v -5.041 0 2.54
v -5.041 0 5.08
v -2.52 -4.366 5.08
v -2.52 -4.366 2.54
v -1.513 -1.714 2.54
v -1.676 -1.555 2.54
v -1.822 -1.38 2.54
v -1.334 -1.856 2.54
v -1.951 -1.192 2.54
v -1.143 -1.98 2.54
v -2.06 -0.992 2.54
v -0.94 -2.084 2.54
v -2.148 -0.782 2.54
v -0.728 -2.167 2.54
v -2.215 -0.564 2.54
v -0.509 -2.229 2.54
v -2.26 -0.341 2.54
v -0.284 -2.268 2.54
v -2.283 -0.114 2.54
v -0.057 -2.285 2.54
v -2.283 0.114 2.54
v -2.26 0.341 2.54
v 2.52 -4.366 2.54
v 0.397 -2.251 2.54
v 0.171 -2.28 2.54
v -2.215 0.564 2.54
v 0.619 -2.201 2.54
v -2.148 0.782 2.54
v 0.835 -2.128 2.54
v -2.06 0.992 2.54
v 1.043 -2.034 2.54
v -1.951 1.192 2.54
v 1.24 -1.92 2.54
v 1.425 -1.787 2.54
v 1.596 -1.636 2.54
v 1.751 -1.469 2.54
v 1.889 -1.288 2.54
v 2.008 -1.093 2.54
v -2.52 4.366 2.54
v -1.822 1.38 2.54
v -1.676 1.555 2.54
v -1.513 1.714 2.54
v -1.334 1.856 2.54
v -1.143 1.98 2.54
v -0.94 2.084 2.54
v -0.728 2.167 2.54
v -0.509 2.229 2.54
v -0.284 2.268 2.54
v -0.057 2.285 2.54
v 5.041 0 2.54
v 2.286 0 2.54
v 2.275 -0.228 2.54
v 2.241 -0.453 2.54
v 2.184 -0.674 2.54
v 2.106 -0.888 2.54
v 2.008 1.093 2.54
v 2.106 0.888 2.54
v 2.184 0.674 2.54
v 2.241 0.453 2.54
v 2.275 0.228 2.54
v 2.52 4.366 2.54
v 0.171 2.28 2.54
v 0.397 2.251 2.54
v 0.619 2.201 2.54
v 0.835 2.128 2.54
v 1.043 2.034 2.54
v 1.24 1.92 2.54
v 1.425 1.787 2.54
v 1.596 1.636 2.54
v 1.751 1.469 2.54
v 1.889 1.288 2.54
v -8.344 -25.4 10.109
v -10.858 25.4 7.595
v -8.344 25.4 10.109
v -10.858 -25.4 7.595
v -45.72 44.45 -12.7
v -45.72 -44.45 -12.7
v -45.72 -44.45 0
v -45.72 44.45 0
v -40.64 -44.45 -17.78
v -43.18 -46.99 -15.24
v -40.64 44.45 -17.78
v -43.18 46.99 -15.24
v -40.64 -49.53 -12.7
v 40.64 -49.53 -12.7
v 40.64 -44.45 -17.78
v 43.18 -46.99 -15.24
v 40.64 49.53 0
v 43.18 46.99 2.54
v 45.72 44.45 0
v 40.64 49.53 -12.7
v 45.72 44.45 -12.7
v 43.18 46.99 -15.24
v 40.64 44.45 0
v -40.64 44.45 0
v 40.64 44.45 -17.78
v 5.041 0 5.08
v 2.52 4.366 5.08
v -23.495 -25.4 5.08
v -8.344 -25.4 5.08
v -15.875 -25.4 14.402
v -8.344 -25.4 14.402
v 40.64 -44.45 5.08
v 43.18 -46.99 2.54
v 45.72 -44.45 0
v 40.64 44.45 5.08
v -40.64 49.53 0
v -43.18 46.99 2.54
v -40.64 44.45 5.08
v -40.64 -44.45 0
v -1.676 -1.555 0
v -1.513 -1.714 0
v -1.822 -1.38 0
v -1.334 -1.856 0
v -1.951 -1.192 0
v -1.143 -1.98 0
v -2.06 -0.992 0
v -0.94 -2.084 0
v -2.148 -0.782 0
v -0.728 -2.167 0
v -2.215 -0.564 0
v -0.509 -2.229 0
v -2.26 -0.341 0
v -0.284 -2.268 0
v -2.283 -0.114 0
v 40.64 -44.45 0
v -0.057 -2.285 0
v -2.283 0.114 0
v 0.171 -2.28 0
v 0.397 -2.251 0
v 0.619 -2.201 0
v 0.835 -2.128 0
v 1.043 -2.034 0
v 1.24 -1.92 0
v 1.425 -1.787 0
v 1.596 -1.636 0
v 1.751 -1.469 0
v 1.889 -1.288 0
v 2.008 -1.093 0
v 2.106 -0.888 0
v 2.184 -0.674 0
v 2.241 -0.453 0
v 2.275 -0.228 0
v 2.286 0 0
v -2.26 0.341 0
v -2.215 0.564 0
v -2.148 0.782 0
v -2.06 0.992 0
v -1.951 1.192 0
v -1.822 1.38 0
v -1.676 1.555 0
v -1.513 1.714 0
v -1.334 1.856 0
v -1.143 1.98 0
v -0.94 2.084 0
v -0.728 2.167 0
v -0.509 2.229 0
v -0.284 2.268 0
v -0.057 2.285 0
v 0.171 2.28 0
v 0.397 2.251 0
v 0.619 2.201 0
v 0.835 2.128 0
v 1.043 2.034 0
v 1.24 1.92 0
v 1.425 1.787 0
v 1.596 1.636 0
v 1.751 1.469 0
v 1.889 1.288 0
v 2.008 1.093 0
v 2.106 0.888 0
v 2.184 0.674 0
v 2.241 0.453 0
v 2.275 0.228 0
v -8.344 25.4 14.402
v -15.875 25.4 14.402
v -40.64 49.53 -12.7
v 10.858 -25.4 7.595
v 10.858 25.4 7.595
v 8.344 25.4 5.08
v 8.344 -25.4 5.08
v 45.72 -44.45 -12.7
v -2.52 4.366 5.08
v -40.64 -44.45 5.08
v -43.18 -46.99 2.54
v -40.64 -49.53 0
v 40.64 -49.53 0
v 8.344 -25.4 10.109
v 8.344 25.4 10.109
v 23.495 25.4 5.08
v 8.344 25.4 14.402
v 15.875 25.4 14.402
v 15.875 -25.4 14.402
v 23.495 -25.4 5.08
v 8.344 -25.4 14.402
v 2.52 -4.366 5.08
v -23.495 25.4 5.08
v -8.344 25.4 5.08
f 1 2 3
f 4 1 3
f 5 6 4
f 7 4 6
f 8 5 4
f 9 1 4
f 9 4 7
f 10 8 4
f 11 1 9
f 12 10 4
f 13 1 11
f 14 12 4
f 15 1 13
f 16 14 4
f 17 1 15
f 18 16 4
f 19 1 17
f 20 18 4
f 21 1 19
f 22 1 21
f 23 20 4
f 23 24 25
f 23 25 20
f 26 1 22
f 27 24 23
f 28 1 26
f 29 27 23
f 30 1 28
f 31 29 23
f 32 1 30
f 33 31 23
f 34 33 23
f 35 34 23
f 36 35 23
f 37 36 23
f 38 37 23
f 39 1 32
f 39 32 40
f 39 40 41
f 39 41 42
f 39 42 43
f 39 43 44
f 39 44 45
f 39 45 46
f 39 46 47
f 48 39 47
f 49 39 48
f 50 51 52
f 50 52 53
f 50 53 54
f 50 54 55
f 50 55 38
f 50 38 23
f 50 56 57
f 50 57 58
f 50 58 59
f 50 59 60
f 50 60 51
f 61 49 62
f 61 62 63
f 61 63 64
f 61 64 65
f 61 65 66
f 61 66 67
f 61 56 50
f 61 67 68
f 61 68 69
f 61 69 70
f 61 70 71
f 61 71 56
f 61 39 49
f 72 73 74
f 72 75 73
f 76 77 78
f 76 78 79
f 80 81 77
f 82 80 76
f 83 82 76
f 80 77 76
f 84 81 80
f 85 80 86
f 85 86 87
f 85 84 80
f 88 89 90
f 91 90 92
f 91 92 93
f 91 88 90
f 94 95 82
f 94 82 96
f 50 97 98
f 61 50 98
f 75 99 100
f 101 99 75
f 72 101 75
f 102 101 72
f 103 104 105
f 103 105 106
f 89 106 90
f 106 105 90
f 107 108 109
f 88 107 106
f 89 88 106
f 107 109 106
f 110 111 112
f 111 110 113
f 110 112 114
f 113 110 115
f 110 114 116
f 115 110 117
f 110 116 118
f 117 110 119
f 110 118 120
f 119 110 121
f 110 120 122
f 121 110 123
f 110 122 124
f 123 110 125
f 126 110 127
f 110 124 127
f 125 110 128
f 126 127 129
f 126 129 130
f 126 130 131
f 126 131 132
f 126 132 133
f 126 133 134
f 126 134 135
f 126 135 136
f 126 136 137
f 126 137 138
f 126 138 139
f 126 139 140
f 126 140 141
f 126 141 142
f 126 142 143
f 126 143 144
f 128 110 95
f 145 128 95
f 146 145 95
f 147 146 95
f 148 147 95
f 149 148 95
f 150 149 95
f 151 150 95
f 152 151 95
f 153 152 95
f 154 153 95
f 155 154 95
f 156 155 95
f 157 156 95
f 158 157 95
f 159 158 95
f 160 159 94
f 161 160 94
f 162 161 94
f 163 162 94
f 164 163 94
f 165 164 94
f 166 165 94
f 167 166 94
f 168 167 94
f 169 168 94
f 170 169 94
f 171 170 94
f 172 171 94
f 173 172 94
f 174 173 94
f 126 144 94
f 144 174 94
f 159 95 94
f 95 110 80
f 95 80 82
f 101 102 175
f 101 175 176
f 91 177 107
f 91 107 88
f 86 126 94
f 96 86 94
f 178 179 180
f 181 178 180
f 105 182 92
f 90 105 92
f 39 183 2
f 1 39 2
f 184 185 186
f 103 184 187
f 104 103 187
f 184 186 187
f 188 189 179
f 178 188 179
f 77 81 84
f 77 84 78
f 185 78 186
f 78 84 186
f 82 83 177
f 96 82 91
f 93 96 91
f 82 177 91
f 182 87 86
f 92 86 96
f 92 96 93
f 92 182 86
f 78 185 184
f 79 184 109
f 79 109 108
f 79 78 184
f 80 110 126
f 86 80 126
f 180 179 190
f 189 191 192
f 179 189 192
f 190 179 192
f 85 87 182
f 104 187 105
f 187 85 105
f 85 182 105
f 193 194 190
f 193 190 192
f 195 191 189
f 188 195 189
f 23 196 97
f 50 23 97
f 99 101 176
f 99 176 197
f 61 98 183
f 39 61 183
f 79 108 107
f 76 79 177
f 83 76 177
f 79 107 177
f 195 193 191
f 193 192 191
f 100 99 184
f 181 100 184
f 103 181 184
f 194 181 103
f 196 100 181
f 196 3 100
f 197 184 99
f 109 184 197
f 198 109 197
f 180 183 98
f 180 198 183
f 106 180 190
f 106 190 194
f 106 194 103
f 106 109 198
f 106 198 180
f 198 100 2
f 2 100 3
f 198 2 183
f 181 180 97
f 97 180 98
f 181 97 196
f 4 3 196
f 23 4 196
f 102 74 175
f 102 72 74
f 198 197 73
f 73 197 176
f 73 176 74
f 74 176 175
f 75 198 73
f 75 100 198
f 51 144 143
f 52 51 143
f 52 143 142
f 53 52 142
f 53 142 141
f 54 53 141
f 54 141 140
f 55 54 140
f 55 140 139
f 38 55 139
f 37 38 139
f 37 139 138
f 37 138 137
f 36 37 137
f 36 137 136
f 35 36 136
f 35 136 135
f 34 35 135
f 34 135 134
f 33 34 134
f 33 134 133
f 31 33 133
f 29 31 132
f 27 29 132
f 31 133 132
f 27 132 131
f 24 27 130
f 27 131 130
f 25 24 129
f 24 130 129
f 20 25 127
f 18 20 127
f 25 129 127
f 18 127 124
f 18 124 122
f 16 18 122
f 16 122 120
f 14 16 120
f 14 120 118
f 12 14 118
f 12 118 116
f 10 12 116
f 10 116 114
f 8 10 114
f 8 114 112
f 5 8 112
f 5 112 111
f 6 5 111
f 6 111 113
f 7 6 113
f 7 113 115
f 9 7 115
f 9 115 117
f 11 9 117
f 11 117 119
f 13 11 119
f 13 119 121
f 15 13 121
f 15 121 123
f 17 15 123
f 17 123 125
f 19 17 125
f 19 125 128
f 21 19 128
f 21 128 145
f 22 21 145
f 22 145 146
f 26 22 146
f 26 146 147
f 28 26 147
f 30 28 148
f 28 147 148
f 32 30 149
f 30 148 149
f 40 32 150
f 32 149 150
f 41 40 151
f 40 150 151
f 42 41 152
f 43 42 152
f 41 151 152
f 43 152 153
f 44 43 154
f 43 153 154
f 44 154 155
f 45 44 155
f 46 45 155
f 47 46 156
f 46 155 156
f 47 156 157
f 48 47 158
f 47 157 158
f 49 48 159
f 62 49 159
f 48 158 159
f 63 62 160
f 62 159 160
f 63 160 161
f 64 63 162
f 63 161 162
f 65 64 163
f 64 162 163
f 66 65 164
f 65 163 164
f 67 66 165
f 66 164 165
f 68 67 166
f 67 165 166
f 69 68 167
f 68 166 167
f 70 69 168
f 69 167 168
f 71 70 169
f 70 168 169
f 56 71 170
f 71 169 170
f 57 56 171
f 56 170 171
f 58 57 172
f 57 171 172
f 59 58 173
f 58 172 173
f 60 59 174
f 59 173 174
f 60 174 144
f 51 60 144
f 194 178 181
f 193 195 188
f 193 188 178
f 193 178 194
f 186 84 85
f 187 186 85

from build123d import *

# Parameters (mm, degrees)
F0_W       = 91.4399989891
F0_H       = 99.0599989891
F0_W_2     = 81.28
F0_H_2     = 88.9
F1_DEPTH   = 17.78
F2_W       = 91.4399989891
F2_H       = 99.0599989891
F3_DEPTH   = 5.08
F4_SIZE    = 5.08
F6_DEPTH   = 25.4
F7_R       = 2.286
F8_DEPTH   = 25.4
F10_DEPTH  = 2.54
F11_SIZE   = 5.07999
F11_SIZE_2 = 5.08
F13_DEPTH  = 50.8


# Not quite as in the source:
# - a fillet or chamfer is up to 0.001 mm smaller than in the source, because OpenCascade refuses the exact size


with BuildPart() as f1:
    # F0 (on Top) → F1 (new body)
    with BuildSketch(Plane.XY):
        Rectangle(F0_W, F0_H)
        Rectangle(F0_W_2, F0_H_2, mode=Mode.SUBTRACT)
    extrude(amount=-F1_DEPTH)

    # F2 (on face) → F3 (join)
    with BuildSketch(Plane.XY):
        Rectangle(F2_W, F2_H)
    extrude(amount=F3_DEPTH)

    # F4
    f4_edges = [f1.edges().sort_by_distance(p)[0] for p in [
        (-45.719999, 49.529999, -6.35),
        (45.719999, 49.529999, -6.35),
        (45.719999, -49.529999, -6.35),
        (-45.719999, -49.529999, -6.35),
    ]]
    chamfer(f4_edges, length=F4_SIZE)

    # F5 (on Front) → F6 (join, symmetric)
    with BuildSketch(Plane.XZ):
        Polygon((10.8585, 7.5946), (8.3439, 5.08), (15.875, 5.08), (15.875, 14.4018), (8.3439, 14.4018), (8.3439, 10.1092), align=None)
        Polygon((-8.3439, 10.1092), (-8.3439, 14.4018), (-15.875, 14.4018), (-15.875, 5.08), (-8.3439, 5.08), (-10.8585, 7.5946), align=None)
    extrude(amount=F6_DEPTH, both=True)

    # F7 (on face) → F8 (cut)
    with BuildSketch(Plane(origin=(0, 0, 0), x_dir=(1, 0, 0), z_dir=(0, 0, -1))):
        Circle(F7_R)
    extrude(amount=-F8_DEPTH, mode=Mode.SUBTRACT)

    # F9 (on face) → F10 (cut)
    with BuildSketch(Plane.XY.offset(5.08)):
        Polygon((2.5204947689, 4.365625), (-2.5204947689, 4.365625), (-5.0409895379, 0), (-2.5204947689, -4.365625), (2.5204947689, -4.365625), (5.0409895379, 0), align=None)
    extrude(amount=-F10_DEPTH, mode=Mode.SUBTRACT)

    # F11 (call 1 of 8: OpenCascade refuses the feature's edges together) (size 5.08 in the source; OpenCascade refuses exactly that, so slightly less here)
    f11_edges = [f1.edges().sort_by_distance(p)[0] for p in [
        (0, 49.529999, -17.78),
    ]]
    chamfer(f11_edges, length=F11_SIZE)

    # F11#2 (call 2 of 8) (size 5.08 in the source; OpenCascade refuses exactly that, so slightly less here)
    f11_2_edges = [f1.edges().sort_by_distance(p)[0] for p in [
        (-45.719999, 0, -17.78),
    ]]
    chamfer(f11_2_edges, length=F11_SIZE)

    # F11#3 (call 3 of 8) (size 5.08 in the source; OpenCascade refuses exactly that, so slightly less here)
    f11_3_edges = [f1.edges().sort_by_distance(p)[0] for p in [
        (0, -49.529999, -17.78),
    ]]
    chamfer(f11_3_edges, length=F11_SIZE)

    # F11#4 (call 4 of 8) (size 5.08 in the source; OpenCascade refuses exactly that, so slightly less here)
    f11_4_edges = [f1.edges().sort_by_distance(p)[0] for p in [
        (45.719999, 0, -17.78),
    ]]
    chamfer(f11_4_edges, length=F11_SIZE)

    # F11#5 (call 5 of 8)
    f11_5_edges = [f1.edges().sort_by_distance(p)[0] for p in [
        (0, 49.529999, 5.08),
    ]]
    chamfer(f11_5_edges, length=F11_SIZE_2)

    # F11#6 (call 6 of 8)
    f11_6_edges = [f1.edges().sort_by_distance(p)[0] for p in [
        (-45.719999, 0, 5.08),
    ]]
    chamfer(f11_6_edges, length=F11_SIZE_2)

    # F11#7 (call 7 of 8)
    f11_7_edges = [f1.edges().sort_by_distance(p)[0] for p in [
        (0, -49.529999, 5.08),
    ]]
    chamfer(f11_7_edges, length=F11_SIZE_2)

    # F11#8 (call 8 of 8)
    f11_8_edges = [f1.edges().sort_by_distance(p)[0] for p in [
        (45.719999, 0, 5.08),
    ]]
    chamfer(f11_8_edges, length=F11_SIZE_2)

    # F12 (on face) → F13 (join, through all)
    with BuildSketch(Plane.XZ.offset(25.4)):
        Polygon((-15.875, 14.4018), (-23.495, 5.08), (-15.875, 5.08), align=None)
        Polygon((23.495, 5.08), (15.875, 14.4018), (15.875, 5.08), align=None)
    extrude(amount=-F13_DEPTH)


solid = f1.part
